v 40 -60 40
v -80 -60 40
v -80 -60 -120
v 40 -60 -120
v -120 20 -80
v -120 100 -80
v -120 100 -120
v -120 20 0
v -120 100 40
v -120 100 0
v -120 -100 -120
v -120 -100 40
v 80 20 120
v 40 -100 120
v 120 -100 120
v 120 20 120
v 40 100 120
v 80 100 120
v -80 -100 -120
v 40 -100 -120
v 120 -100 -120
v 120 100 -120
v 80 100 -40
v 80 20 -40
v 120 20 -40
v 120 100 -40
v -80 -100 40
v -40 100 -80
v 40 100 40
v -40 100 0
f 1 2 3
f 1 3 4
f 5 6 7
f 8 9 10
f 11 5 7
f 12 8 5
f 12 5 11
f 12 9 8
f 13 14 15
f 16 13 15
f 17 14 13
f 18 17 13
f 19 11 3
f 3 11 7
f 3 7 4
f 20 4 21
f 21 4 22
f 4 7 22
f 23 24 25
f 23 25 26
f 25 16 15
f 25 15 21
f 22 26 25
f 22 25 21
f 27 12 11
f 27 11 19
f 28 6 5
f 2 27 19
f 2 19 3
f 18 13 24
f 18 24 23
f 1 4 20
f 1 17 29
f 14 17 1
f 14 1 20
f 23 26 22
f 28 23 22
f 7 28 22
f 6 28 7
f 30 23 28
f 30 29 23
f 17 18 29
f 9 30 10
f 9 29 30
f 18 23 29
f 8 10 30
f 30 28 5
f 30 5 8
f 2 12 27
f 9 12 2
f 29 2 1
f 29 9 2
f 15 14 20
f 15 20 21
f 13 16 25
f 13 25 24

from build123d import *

# Parameters (mm, degrees)
BOSS_EXTRUDE1_DEPTH      = 120
BOSS_EXTRUDE2_DEPTH      = 120
SKETCH3_W                = 80
SKETCH3_H                = 80
BOSS_EXTRUDE3_DEPTH      = 40
BOSS_EXTRUDE4_DEPTH      = 40
BOSS_EXTRUDE5_DEPTH      = 120
SPLIT4_SURFACE_1_1_BACK  = 394.954
SPLIT4_SURFACE_1_1_DEPTH = 789.908
SPLIT4_SURFACE_1_2_BACK  = 394.954
SPLIT4_SURFACE_1_2_DEPTH = 789.908
SPLIT4_SURFACE_2_3_BACK  = 394.954
SPLIT4_SURFACE_2_3_DEPTH = 789.908
SPLIT4_SURFACE_2_4_BACK  = 394.954
SPLIT4_SURFACE_2_4_DEPTH = 789.908
CHAMFER4_SIZE            = 80


with BuildPart() as part:
    # Sketch1 → Boss-Extrude1 (new body)
    with BuildSketch(Plane.XY):
        Polygon((120, -100), (120, 20), (80, 20), (80, 100), (40, 100), (40, -60), (40, -100), align=None)
    extrude(amount=BOSS_EXTRUDE1_DEPTH)

    # Sketch1<3> → Boss-Extrude2 (add)
    with BuildSketch(Plane.XY):
        Polygon((120, -100), (120, 20), (80, 20), (80, 100), (40, 100), (40, -60), (40, -100), align=None)
    extrude(amount=-BOSS_EXTRUDE2_DEPTH)

    # Sketch3 → Boss-Extrude3 (add)
    with BuildSketch(Plane(origin=(80, 0, 0), x_dir=(0, 0, -1), z_dir=(1, 0, 0))):
        with Locations((80, 60)):
            Rectangle(SKETCH3_W, SKETCH3_H)
    extrude(amount=BOSS_EXTRUDE3_DEPTH)

    # Sketch1<4> → Boss-Extrude4 (add)
    with BuildSketch(Plane.XY):
        Polygon((40, -60), (40, 100), (-120, 100), (-120, -100), (-80, -100), (-80, -60), align=None)
    extrude(amount=BOSS_EXTRUDE4_DEPTH)

    # Sketch1<5> → Boss-Extrude5 (add)
    with BuildSketch(Plane.XY):
        Polygon((40, -60), (40, 100), (-120, 100), (-120, -100), (-80, -100), (-80, -60), align=None)
    extrude(amount=-BOSS_EXTRUDE5_DEPTH)


with BuildPart() as body_2:
    # Split4: the piece behind the surface
    add(part.part)
    # Split4 surface 1: a surface, the sketch's curves swept straight by 789.908 mm
    with BuildLine(Plane(origin=(0, 100, 0), x_dir=(1, 0, 0), z_dir=(0, 1, 0)).offset(-SPLIT4_SURFACE_1_1_BACK), mode=Mode.PRIVATE) as split4_surface_1_1_path:
        Line((-120, 0), (120, 0))
    split4_surface_1_1 = Shell.extrude(split4_surface_1_1_path.wire(), (0 * SPLIT4_SURFACE_1_1_DEPTH, 1 * SPLIT4_SURFACE_1_1_DEPTH, 0 * SPLIT4_SURFACE_1_1_DEPTH))
    split(bisect_by=split4_surface_1_1, keep=Keep.BOTTOM)


with BuildPart() as part_1:
    add(part.part)

    # Split4: split by a surface, the side it looks to stays
    # Split4 surface 1: a surface, the sketch's curves swept straight by 789.908 mm
    with BuildLine(Plane(origin=(0, 100, 0), x_dir=(1, 0, 0), z_dir=(0, 1, 0)).offset(-SPLIT4_SURFACE_1_2_BACK), mode=Mode.PRIVATE) as split4_surface_1_2_path:
        Line((-120, 0), (120, 0))
    split4_surface_1_2 = Shell.extrude(split4_surface_1_2_path.wire(), (0 * SPLIT4_SURFACE_1_2_DEPTH, 1 * SPLIT4_SURFACE_1_2_DEPTH, 0 * SPLIT4_SURFACE_1_2_DEPTH))
    split(bisect_by=split4_surface_1_2, keep=Keep.TOP)


with BuildPart() as body_3:
    # Split4 2: the piece behind the surface
    add(part_1.part)
    # Split4 surface 2: a surface, the sketch's curves swept straight by 789.908 mm
    with BuildLine(Plane(origin=(0, 100, 0), x_dir=(1, 0, 0), z_dir=(0, 1, 0)).offset(-SPLIT4_SURFACE_2_3_BACK), mode=Mode.PRIVATE) as split4_surface_2_3_path:
        Line((-120, 80), (120, 80))
    split4_surface_2_3 = Shell.extrude(split4_surface_2_3_path.wire(), (0 * SPLIT4_SURFACE_2_3_DEPTH, 1 * SPLIT4_SURFACE_2_3_DEPTH, 0 * SPLIT4_SURFACE_2_3_DEPTH))
    split(bisect_by=split4_surface_2_3, keep=Keep.BOTTOM)

    # Chamfer4
    chamfer4_edges = [body_3.edges().sort_by_distance(p)[0] for p in [
        (-120, 100, -40),
    ]]
    chamfer(chamfer4_edges, length=CHAMFER4_SIZE)


with BuildPart() as part_2:
    add(part_1.part)

    # Split4 2: split by a surface, the side it looks to stays
    # Split4 surface 2: a surface, the sketch's curves swept straight by 789.908 mm
    with BuildLine(Plane(origin=(0, 100, 0), x_dir=(1, 0, 0), z_dir=(0, 1, 0)).offset(-SPLIT4_SURFACE_2_4_BACK), mode=Mode.PRIVATE) as split4_surface_2_4_path:
        Line((-120, 80), (120, 80))
    split4_surface_2_4 = Shell.extrude(split4_surface_2_4_path.wire(), (0 * SPLIT4_SURFACE_2_4_DEPTH, 1 * SPLIT4_SURFACE_2_4_DEPTH, 0 * SPLIT4_SURFACE_2_4_DEPTH))
    split(bisect_by=split4_surface_2_4, keep=Keep.TOP)


with BuildPart() as body_3_1:
    add(body_3.part)

    # Combine2: union part, body 2
    add(part_2.part)
    add(body_2.part)


solid = body_3_1.part
